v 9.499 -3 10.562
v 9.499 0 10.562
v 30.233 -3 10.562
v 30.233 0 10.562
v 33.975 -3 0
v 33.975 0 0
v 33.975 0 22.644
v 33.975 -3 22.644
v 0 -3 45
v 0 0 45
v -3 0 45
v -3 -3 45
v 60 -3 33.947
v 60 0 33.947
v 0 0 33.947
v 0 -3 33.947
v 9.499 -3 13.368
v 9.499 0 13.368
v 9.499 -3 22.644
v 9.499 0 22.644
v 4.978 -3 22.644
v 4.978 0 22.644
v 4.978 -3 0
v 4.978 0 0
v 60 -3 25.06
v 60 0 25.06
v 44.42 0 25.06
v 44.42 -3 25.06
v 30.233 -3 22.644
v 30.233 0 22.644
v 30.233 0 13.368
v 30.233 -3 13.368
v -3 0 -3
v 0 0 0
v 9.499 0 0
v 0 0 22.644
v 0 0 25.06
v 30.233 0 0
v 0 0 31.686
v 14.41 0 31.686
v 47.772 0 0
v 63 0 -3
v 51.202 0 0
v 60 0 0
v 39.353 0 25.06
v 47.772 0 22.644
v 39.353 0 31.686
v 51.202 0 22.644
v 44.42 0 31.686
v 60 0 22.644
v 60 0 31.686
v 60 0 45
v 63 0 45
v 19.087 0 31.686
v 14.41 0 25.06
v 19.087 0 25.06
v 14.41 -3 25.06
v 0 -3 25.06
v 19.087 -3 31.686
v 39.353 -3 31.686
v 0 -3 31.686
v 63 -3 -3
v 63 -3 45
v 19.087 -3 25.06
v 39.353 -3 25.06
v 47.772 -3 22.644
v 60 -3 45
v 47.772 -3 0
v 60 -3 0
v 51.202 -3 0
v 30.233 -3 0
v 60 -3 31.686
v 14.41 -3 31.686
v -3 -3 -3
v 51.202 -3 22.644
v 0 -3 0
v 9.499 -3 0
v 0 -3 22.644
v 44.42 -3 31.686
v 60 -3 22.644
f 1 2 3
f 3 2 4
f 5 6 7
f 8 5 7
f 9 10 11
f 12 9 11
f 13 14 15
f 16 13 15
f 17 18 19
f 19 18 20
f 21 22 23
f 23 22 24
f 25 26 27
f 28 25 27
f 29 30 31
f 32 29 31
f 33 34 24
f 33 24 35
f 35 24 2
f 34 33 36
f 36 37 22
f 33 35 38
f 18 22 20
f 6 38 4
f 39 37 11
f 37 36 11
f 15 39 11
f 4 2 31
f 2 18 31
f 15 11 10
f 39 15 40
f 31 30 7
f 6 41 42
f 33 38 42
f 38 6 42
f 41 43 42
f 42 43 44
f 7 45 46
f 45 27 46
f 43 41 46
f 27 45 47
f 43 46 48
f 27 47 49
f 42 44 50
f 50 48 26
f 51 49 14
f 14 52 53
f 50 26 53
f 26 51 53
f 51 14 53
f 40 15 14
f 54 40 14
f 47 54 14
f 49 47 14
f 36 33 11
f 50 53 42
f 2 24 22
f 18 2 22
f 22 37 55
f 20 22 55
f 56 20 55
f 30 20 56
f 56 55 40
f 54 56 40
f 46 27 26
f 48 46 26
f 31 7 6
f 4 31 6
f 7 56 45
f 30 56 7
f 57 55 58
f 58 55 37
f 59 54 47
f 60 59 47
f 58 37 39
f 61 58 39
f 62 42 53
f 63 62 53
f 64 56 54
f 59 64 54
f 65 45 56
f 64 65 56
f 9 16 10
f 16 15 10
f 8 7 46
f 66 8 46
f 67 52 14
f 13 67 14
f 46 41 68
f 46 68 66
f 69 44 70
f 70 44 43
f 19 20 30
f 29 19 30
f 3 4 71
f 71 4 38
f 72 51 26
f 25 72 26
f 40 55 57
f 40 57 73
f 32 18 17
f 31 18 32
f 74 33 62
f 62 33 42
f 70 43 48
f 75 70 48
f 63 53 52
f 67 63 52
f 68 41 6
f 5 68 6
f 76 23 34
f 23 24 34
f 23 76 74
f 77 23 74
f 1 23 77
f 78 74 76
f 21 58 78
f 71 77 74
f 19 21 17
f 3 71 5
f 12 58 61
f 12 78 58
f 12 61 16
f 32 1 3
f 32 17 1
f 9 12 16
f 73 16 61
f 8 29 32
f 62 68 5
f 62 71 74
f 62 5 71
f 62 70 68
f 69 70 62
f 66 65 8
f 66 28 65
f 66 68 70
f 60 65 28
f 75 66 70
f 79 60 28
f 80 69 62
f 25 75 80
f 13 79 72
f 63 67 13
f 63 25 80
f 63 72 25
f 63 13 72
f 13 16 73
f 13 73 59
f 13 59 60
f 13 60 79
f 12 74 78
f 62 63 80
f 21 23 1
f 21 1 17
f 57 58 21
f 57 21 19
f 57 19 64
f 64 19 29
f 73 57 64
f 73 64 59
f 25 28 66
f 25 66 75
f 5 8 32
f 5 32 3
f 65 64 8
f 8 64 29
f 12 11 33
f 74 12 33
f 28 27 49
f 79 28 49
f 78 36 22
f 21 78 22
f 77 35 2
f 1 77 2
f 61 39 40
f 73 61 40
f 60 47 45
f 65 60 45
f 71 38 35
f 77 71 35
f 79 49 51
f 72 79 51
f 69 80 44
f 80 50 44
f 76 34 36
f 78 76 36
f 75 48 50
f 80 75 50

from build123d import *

# Parameters (mm, degrees)
F1_DEPTH = 60
F2_W     = 5.0666704774
F2_H     = 6.6256467253
F2_H_2   = 1.0133311152
F2_W_2   = 4.6769259498
F2_H_3   = 1.2471787632
F2_H_4   = 1.4030765742
F2_W_3   = 3.4297443926
F2_H_5   = 23.8523234148
F2_H_6   = 0.8574351668
F2_W_4   = 4.5210286044
F2_H_7   = 1.0133348405
F2_W_5   = 3.7415400147
F2_W_6   = 20.7343716174
F2_H_8   = 2.8061550111
F2_W_7   = 1.1692317203
F2_W_8   = 1.4030784369
F3_DEPTH = 3
F4_W     = 106.1131954193
F4_H     = 74.4311399758
F5_DEPTH = 57


with BuildPart() as f1:
    # F0 (on Front) → F1 (new body)
    with BuildSketch(Plane.XZ):
        Polygon((60, 0), (0, 0), (0, 45), (-3, 45), (-3, -3), (63, -3), (63, 45), (60, 45), align=None)
    extrude(amount=F1_DEPTH)

    # F2 (on Front) → F3 (join)
    with BuildSketch(Plane.XZ):
        Polygon((60.8672574162, 31.6860154271), (60.8672574162, 33.9465290308), (-0.9461171576, 33.9465290308), (-0.9461171576, 31.6860154271), (14.4097907469, 31.6860154271), (14.4097907469, 32.9331941903), (19.0867166966, 32.9331941903), (19.0867166966, 31.6860154271), (39.3533967435, 31.6860154271), (39.3533967435, 32.6993465424), (44.4200672209, 32.6993465424), (44.4200672209, 31.6860154271), align=None)
        with Locations((41.8867319822, 28.3731920645)):
            Rectangle(F2_W, F2_H)
        with Locations((41.8867319822, 32.1926809847)):
            Rectangle(F2_W, F2_H_2)
        with Locations((16.7482537217, 32.3096048087)):
            Rectangle(F2_W_2, F2_H_3)
        with Locations((16.7482537217, 28.3731920645)):
            Rectangle(F2_W_2, F2_H)
        with Locations((41.8867319822, 24.3588304147)):
            Rectangle(F2_W, F2_H_4)
        Polygon((62.0364882052, 25.0603687018), (44.4200672209, 25.0603687018), (44.4200672209, 23.6572921276), (39.3533967435, 23.6572921276), (39.3533967435, 25.0603687018), (19.0867166966, 25.0603687018), (19.0867166966, 23.6572921276), (14.4097907469, 23.6572921276), (14.4097907469, 25.0603687018), (-2.1932963282, 25.0603687018), (-2.1932963282, 22.6439572871), (4.9779904075, 22.6439572871), (4.9779904075, 23.6572921276), (9.4990190119, 23.6572921276), (9.4990190119, 22.6439572871), (30.2333906293, 22.6439572871), (30.2333906293, 23.5013924539), (33.974930644, 23.5013924539), (33.974930644, 22.6439572871), (47.7718636394, 22.6439572871), (47.7718636394, 23.5013924539), (51.201608032, 23.5013924539), (51.201608032, 22.6439572871), (62.0364882052, 22.6439572871), align=None)
        with Locations((16.7482537217, 24.3588304147)):
            Rectangle(F2_W_2, F2_H_4)
        with Locations((49.4867358357, 10.7177955797)):
            Rectangle(F2_W_3, F2_H_5)
        with Locations((49.4867358357, 23.0726748705)):
            Rectangle(F2_W_3, F2_H_6)
        with Locations((7.2385047097, 23.1506247073)):
            Rectangle(F2_W_4, F2_H_7)
        Polygon((9.4990190119, 22.6439572871), (4.9779904075, 22.6439572871), (4.9779904075, -1.2083661277), (9.4990190119, -1.2083661277), (9.4990190119, 10.5618983507), (8.3297872916, 10.5618983507), (8.3297872916, 13.3680533618), (9.4990190119, 13.3680533618), align=None)
        Polygon((33.974930644, -1.2083661277), (33.974930644, 22.6439572871), (30.2333906293, 22.6439572871), (30.2333906293, 13.3680533618), (31.6364690661, 13.3680533618), (31.6364690661, 10.5618983507), (30.2333906293, 10.5618983507), (30.2333906293, -1.2083661277), align=None)
        with Locations((32.1041606367, 23.0726748705)):
            Rectangle(F2_W_5, F2_H_6)
        with Locations((19.8662048206, 11.9649758562)):
            Rectangle(F2_W_6, F2_H_8)
        with Locations((8.9144031517, 11.9649758562)):
            Rectangle(F2_W_7, F2_H_8)
        with Locations((30.9349298477, 11.9649758562)):
            Rectangle(F2_W_8, F2_H_8)
    extrude(amount=F3_DEPTH)

    # F4 (on face) → F5 (cut, through all)
    with BuildSketch(Plane.XZ.offset(60)):
        with Locations((33.7975099683, 20.7829978317)):
            Rectangle(F4_W, F4_H)
    extrude(amount=-F5_DEPTH, mode=Mode.SUBTRACT)


solid = f1.part
